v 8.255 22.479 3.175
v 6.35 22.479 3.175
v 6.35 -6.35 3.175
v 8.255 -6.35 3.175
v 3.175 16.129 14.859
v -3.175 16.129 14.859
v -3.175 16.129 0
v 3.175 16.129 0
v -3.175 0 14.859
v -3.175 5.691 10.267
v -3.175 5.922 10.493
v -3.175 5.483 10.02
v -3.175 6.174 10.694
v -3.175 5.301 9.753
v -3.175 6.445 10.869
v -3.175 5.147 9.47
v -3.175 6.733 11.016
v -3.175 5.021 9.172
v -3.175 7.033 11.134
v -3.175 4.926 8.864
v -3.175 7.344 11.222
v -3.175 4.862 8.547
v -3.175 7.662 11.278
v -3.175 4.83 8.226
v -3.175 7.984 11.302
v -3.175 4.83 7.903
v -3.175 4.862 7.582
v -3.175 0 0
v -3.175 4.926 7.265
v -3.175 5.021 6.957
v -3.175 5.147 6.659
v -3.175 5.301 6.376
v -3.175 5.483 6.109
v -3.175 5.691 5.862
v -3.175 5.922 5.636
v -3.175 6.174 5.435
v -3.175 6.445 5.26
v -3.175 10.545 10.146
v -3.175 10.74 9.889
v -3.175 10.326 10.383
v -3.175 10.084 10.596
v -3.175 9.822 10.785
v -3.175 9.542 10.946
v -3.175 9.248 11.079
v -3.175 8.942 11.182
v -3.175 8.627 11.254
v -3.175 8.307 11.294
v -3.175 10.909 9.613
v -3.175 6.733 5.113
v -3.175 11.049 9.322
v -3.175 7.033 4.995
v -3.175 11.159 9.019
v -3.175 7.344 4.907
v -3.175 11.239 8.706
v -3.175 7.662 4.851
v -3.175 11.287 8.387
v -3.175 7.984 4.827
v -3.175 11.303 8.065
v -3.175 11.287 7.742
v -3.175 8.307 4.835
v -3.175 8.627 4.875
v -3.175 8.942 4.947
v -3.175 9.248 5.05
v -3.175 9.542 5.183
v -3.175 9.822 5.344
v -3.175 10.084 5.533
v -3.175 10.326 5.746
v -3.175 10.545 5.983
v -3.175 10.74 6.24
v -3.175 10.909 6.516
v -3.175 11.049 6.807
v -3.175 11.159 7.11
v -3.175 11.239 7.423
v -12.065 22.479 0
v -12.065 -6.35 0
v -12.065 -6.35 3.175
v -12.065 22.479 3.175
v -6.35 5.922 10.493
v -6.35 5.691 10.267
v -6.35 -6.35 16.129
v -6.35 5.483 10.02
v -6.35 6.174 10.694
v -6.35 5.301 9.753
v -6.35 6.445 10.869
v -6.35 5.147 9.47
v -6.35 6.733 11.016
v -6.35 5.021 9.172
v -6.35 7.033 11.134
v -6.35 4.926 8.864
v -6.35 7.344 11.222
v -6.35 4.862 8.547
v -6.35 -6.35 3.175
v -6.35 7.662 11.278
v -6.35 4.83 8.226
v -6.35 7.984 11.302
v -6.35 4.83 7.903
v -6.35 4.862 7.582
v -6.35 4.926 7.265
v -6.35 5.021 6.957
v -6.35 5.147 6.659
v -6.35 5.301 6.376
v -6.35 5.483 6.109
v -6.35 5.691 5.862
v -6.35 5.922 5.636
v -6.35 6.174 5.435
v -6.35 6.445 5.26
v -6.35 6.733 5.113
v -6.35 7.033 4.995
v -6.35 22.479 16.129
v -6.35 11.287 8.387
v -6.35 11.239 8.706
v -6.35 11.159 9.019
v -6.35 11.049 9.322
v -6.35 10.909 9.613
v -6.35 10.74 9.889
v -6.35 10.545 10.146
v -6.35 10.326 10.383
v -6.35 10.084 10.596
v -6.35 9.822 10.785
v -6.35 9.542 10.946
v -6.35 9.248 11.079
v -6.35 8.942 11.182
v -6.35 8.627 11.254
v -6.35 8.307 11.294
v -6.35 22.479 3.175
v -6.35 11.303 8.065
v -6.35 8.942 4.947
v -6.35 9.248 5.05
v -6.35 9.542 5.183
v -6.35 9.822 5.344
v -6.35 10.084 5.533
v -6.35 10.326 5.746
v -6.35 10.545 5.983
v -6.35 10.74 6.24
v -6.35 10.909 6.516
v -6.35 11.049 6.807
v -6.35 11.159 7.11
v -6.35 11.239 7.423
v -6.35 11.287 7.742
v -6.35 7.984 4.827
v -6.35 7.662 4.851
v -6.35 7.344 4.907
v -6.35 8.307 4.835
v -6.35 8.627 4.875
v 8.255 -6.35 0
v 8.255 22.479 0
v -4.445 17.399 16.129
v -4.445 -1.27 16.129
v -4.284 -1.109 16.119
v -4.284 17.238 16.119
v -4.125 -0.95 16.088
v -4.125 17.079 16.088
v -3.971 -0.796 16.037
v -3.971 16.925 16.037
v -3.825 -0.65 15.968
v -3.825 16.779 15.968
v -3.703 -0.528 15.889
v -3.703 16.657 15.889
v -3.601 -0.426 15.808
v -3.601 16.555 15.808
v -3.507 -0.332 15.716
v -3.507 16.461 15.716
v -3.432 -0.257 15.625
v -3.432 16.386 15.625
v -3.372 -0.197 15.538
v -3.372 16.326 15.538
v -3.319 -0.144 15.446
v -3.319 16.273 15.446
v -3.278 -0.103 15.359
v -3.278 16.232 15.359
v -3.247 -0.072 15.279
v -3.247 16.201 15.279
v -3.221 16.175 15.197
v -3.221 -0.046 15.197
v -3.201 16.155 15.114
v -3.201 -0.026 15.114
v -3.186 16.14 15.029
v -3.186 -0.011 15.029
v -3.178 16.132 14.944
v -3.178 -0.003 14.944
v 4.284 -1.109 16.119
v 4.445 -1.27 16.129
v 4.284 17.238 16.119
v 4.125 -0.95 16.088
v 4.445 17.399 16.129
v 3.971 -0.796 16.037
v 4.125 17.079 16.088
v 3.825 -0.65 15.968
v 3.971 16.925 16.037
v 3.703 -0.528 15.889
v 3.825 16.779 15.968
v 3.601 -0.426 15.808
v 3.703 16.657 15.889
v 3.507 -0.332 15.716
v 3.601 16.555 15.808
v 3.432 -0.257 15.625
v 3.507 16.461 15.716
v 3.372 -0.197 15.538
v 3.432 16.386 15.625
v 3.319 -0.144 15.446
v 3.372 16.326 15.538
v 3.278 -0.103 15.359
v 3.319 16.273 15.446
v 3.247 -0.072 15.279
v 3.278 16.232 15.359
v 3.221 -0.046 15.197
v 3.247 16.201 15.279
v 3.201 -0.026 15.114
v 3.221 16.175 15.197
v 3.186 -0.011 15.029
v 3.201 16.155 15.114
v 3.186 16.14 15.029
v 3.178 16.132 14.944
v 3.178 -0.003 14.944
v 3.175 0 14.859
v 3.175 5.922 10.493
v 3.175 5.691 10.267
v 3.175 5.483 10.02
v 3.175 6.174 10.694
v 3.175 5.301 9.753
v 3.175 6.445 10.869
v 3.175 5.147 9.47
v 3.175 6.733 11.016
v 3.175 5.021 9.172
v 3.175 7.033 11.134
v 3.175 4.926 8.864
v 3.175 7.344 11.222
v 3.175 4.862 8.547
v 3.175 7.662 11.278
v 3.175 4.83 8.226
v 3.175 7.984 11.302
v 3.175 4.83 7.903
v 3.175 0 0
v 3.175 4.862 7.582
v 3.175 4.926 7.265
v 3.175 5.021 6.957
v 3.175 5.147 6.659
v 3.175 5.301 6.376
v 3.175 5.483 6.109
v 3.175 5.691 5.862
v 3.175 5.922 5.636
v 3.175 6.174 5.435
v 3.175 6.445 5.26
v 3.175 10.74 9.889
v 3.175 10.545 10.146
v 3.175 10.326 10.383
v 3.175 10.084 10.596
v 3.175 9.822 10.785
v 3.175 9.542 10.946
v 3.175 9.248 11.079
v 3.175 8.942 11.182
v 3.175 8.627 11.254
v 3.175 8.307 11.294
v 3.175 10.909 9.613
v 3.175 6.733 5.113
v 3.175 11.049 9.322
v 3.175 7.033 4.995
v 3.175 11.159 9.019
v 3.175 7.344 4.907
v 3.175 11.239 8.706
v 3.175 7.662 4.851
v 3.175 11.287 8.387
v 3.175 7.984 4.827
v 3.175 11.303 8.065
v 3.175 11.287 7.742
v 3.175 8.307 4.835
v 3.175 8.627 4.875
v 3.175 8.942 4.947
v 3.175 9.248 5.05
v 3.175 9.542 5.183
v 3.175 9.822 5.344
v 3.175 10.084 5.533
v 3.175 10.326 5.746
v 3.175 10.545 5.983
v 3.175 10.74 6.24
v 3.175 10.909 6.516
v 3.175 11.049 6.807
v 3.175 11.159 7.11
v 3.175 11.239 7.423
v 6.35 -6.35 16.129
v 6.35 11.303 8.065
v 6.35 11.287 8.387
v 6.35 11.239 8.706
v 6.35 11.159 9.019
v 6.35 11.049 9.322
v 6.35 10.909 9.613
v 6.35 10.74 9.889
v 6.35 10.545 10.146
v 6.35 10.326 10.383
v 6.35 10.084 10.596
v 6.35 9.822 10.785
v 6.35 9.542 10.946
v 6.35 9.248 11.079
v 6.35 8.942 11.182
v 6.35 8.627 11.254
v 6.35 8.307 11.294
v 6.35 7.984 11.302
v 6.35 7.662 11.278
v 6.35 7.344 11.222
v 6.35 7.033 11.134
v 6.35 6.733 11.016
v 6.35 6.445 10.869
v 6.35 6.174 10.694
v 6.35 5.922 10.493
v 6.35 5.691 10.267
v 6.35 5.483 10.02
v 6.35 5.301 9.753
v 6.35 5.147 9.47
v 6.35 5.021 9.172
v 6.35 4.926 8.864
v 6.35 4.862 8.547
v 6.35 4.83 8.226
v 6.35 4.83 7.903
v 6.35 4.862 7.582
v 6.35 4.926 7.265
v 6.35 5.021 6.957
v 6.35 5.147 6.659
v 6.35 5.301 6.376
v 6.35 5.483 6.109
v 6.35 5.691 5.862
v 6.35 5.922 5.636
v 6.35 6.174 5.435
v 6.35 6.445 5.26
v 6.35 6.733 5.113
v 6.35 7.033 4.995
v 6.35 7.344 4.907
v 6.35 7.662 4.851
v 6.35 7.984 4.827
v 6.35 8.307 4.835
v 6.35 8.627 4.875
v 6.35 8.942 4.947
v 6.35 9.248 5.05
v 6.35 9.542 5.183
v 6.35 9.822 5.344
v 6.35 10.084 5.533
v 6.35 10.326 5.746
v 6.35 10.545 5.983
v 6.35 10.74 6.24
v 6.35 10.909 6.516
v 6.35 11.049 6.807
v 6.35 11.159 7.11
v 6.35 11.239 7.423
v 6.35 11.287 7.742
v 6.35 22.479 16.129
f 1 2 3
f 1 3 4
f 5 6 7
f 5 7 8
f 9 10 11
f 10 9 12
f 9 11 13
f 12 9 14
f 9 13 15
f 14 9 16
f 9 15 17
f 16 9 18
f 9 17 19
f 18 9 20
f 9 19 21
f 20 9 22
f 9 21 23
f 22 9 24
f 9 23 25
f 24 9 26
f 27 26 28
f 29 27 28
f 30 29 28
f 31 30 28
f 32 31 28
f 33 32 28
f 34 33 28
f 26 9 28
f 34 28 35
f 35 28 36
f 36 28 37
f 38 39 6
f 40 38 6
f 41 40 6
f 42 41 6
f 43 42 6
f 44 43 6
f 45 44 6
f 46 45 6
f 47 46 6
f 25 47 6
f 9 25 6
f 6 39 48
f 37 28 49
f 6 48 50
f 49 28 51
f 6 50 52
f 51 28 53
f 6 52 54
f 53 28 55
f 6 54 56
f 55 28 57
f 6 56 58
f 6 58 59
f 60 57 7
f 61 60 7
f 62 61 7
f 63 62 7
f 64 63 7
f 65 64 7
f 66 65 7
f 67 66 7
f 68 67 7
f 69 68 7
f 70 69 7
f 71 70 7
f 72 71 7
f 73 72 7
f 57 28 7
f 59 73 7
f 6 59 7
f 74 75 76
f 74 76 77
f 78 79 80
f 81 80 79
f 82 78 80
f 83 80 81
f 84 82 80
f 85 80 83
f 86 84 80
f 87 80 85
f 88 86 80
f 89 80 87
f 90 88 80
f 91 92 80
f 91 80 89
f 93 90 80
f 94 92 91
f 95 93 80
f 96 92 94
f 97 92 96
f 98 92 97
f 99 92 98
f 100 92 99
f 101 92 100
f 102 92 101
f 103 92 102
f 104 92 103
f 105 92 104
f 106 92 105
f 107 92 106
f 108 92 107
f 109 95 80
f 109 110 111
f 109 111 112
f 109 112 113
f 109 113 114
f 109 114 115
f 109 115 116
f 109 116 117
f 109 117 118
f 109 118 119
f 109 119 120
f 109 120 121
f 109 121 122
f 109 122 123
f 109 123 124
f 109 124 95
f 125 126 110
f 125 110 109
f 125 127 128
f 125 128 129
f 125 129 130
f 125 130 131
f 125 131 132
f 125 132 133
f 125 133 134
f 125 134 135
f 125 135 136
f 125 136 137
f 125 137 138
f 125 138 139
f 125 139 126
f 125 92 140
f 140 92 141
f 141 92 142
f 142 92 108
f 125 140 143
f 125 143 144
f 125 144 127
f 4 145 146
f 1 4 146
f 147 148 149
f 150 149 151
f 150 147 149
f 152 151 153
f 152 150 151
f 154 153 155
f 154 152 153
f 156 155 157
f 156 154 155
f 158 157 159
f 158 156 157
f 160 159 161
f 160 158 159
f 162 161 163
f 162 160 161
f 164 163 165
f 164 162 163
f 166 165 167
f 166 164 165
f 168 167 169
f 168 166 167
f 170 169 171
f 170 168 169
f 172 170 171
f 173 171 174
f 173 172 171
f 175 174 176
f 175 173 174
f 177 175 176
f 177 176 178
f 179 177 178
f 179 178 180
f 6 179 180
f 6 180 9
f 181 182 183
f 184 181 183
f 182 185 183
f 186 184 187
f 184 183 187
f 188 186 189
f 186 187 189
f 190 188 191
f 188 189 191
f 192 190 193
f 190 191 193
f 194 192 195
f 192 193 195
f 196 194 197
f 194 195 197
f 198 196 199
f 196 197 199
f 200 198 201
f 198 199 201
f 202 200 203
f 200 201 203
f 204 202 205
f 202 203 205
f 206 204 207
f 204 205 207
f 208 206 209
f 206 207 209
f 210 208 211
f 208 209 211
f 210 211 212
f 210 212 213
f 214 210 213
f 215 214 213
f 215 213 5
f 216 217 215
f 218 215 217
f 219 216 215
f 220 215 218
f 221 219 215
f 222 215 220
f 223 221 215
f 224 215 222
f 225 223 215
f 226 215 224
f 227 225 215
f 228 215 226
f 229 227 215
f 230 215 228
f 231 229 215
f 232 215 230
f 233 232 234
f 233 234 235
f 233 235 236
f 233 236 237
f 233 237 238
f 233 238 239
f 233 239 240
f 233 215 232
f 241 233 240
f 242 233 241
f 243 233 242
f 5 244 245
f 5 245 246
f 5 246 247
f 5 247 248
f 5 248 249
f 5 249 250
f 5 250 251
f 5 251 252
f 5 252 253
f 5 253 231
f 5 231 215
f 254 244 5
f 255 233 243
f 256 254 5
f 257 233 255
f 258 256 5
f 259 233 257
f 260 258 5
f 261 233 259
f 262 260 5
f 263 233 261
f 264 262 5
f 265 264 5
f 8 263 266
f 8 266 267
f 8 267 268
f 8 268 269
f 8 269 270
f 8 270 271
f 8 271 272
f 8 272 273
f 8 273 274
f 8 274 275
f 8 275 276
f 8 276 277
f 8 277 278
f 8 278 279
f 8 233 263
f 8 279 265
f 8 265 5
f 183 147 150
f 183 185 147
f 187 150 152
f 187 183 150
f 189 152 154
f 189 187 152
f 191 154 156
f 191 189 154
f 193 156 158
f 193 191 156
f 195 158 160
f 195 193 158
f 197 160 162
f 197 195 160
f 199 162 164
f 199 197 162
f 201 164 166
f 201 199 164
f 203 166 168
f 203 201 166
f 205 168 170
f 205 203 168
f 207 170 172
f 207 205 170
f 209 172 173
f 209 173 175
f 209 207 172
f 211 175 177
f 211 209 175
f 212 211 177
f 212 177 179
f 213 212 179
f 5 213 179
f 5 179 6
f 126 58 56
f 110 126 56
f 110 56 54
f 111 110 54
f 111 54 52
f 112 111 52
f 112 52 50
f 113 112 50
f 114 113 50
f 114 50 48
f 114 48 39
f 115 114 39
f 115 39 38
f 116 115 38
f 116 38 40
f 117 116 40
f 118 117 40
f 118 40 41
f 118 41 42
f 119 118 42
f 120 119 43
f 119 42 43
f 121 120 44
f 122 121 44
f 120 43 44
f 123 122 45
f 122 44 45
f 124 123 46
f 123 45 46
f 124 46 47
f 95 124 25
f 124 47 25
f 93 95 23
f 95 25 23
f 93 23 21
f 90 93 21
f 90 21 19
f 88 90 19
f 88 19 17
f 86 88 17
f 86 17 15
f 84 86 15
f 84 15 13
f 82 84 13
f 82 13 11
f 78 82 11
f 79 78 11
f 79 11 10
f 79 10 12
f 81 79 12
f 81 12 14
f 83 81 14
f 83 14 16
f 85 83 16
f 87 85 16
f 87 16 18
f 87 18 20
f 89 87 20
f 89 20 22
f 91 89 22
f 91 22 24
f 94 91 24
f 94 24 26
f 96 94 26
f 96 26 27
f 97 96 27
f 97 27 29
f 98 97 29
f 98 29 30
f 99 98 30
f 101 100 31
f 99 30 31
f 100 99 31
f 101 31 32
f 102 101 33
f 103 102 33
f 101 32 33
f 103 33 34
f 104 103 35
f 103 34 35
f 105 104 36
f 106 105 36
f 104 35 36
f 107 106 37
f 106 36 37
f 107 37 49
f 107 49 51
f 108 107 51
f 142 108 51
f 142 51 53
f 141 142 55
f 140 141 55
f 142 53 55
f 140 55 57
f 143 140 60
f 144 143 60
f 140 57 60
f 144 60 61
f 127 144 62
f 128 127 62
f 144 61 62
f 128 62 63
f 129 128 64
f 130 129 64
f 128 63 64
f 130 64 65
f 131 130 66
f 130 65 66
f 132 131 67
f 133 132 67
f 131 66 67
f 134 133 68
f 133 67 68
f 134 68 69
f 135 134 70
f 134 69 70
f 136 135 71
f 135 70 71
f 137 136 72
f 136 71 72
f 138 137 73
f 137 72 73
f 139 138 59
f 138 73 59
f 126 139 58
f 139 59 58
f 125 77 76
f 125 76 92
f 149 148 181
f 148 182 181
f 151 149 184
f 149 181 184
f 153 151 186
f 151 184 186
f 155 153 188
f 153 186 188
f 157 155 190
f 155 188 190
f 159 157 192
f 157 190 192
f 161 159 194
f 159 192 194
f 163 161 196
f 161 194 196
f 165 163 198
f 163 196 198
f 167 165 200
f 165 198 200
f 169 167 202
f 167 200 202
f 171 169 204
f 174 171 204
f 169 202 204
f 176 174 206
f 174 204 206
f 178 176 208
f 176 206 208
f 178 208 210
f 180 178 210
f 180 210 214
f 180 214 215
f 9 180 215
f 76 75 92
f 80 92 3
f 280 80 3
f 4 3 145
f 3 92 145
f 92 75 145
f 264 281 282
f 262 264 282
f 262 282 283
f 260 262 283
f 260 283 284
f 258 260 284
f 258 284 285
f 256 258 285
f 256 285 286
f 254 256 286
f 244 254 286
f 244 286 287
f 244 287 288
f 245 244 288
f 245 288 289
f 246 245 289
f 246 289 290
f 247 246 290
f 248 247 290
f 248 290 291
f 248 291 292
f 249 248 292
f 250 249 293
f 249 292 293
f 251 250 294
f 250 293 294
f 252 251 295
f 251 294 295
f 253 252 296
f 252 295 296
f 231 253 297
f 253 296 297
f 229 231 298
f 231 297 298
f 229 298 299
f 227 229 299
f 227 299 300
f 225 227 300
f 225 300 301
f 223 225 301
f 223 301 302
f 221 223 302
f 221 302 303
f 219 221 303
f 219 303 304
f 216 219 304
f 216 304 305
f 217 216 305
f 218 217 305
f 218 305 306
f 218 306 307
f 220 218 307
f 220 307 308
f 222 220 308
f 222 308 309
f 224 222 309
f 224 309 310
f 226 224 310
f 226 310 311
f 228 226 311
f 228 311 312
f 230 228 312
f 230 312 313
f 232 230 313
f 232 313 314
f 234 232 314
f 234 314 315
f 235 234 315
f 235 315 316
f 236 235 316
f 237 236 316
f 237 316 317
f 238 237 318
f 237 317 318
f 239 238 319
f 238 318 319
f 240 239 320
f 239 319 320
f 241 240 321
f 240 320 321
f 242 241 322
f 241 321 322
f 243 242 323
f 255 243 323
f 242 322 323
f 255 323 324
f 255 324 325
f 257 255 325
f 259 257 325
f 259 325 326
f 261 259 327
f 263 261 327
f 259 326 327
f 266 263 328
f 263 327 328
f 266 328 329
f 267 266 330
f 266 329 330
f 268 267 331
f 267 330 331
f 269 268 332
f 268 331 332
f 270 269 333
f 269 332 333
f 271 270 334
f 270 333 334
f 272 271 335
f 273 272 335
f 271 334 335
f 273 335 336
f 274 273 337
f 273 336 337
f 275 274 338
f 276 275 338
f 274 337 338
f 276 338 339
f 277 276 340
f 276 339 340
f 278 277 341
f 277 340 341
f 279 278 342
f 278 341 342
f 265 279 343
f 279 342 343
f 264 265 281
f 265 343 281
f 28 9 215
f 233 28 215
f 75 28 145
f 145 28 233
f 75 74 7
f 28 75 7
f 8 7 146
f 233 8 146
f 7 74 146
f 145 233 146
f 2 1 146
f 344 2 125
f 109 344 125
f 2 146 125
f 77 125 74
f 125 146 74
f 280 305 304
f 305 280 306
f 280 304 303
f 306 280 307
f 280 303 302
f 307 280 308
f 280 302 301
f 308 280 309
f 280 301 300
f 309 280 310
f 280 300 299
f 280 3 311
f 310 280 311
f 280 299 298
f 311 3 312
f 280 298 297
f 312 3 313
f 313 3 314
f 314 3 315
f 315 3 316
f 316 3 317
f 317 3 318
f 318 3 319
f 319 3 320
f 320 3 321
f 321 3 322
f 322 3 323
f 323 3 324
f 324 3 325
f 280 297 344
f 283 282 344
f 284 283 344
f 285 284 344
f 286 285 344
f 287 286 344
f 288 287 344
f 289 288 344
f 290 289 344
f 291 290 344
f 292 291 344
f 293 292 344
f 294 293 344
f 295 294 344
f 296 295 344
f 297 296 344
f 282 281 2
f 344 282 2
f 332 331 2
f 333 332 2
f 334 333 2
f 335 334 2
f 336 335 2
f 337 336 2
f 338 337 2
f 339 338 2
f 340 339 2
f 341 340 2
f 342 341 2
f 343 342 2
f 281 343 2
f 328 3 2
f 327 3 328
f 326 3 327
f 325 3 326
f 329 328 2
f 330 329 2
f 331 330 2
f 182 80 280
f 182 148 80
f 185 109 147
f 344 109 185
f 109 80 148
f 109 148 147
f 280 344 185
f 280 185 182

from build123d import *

# Parameters (mm, degrees)
F0_W     = 12.7
F0_H     = 28.829
F0_W_2   = 6.35
F0_H_2   = 16.129
F0_W_3   = 5.715
F0_W_4   = 1.905
F1_DEPTH = 3.175
F2_DEPTH = 16.129
F3_R     = 3.2385
F4_DEPTH = 18.416
F5_R     = 1.27


with BuildPart() as f1:
    # F0 (on Top) → F1 (new body)
    with BuildSketch(Plane.XY):
        with Locations((0, 8.0645)):
            Rectangle(F0_W, F0_H)
        with Locations((0, 8.0645)):
            Rectangle(F0_W_2, F0_H_2, mode=Mode.SUBTRACT)
        with Locations((-9.2075, 8.0645)):
            Rectangle(F0_W_3, F0_H)
        with Locations((7.3025, 8.0645)):
            Rectangle(F0_W_4, F0_H)
    extrude(amount=F1_DEPTH)

    # F0 (on Top) → F2 (join)
    with BuildSketch(Plane.XY):
        with Locations((0, 8.0645)):
            Rectangle(F0_W, F0_H)
        with Locations((0, 8.0645)):
            Rectangle(F0_W_2, F0_H_2, mode=Mode.SUBTRACT)
    extrude(amount=F2_DEPTH)

    # F3 (on face) → F4 (cut, through all)
    with BuildSketch(Plane.YZ.offset(6.35)):
        with Locations((8.0645, 8.0645)):
            Circle(F3_R)
    extrude(amount=-F4_DEPTH, mode=Mode.SUBTRACT)

    # F5
    f5_edges = [f1.edges().sort_by_distance(p)[0] for p in [
        (3.175, 8.0645, 16.129),
        (-3.175, 8.0645, 16.129),
        (0, 0, 16.129),
        (0, 16.129, 16.129),
    ]]
    fillet(f5_edges, radius=F5_R)


solid = f1.part
